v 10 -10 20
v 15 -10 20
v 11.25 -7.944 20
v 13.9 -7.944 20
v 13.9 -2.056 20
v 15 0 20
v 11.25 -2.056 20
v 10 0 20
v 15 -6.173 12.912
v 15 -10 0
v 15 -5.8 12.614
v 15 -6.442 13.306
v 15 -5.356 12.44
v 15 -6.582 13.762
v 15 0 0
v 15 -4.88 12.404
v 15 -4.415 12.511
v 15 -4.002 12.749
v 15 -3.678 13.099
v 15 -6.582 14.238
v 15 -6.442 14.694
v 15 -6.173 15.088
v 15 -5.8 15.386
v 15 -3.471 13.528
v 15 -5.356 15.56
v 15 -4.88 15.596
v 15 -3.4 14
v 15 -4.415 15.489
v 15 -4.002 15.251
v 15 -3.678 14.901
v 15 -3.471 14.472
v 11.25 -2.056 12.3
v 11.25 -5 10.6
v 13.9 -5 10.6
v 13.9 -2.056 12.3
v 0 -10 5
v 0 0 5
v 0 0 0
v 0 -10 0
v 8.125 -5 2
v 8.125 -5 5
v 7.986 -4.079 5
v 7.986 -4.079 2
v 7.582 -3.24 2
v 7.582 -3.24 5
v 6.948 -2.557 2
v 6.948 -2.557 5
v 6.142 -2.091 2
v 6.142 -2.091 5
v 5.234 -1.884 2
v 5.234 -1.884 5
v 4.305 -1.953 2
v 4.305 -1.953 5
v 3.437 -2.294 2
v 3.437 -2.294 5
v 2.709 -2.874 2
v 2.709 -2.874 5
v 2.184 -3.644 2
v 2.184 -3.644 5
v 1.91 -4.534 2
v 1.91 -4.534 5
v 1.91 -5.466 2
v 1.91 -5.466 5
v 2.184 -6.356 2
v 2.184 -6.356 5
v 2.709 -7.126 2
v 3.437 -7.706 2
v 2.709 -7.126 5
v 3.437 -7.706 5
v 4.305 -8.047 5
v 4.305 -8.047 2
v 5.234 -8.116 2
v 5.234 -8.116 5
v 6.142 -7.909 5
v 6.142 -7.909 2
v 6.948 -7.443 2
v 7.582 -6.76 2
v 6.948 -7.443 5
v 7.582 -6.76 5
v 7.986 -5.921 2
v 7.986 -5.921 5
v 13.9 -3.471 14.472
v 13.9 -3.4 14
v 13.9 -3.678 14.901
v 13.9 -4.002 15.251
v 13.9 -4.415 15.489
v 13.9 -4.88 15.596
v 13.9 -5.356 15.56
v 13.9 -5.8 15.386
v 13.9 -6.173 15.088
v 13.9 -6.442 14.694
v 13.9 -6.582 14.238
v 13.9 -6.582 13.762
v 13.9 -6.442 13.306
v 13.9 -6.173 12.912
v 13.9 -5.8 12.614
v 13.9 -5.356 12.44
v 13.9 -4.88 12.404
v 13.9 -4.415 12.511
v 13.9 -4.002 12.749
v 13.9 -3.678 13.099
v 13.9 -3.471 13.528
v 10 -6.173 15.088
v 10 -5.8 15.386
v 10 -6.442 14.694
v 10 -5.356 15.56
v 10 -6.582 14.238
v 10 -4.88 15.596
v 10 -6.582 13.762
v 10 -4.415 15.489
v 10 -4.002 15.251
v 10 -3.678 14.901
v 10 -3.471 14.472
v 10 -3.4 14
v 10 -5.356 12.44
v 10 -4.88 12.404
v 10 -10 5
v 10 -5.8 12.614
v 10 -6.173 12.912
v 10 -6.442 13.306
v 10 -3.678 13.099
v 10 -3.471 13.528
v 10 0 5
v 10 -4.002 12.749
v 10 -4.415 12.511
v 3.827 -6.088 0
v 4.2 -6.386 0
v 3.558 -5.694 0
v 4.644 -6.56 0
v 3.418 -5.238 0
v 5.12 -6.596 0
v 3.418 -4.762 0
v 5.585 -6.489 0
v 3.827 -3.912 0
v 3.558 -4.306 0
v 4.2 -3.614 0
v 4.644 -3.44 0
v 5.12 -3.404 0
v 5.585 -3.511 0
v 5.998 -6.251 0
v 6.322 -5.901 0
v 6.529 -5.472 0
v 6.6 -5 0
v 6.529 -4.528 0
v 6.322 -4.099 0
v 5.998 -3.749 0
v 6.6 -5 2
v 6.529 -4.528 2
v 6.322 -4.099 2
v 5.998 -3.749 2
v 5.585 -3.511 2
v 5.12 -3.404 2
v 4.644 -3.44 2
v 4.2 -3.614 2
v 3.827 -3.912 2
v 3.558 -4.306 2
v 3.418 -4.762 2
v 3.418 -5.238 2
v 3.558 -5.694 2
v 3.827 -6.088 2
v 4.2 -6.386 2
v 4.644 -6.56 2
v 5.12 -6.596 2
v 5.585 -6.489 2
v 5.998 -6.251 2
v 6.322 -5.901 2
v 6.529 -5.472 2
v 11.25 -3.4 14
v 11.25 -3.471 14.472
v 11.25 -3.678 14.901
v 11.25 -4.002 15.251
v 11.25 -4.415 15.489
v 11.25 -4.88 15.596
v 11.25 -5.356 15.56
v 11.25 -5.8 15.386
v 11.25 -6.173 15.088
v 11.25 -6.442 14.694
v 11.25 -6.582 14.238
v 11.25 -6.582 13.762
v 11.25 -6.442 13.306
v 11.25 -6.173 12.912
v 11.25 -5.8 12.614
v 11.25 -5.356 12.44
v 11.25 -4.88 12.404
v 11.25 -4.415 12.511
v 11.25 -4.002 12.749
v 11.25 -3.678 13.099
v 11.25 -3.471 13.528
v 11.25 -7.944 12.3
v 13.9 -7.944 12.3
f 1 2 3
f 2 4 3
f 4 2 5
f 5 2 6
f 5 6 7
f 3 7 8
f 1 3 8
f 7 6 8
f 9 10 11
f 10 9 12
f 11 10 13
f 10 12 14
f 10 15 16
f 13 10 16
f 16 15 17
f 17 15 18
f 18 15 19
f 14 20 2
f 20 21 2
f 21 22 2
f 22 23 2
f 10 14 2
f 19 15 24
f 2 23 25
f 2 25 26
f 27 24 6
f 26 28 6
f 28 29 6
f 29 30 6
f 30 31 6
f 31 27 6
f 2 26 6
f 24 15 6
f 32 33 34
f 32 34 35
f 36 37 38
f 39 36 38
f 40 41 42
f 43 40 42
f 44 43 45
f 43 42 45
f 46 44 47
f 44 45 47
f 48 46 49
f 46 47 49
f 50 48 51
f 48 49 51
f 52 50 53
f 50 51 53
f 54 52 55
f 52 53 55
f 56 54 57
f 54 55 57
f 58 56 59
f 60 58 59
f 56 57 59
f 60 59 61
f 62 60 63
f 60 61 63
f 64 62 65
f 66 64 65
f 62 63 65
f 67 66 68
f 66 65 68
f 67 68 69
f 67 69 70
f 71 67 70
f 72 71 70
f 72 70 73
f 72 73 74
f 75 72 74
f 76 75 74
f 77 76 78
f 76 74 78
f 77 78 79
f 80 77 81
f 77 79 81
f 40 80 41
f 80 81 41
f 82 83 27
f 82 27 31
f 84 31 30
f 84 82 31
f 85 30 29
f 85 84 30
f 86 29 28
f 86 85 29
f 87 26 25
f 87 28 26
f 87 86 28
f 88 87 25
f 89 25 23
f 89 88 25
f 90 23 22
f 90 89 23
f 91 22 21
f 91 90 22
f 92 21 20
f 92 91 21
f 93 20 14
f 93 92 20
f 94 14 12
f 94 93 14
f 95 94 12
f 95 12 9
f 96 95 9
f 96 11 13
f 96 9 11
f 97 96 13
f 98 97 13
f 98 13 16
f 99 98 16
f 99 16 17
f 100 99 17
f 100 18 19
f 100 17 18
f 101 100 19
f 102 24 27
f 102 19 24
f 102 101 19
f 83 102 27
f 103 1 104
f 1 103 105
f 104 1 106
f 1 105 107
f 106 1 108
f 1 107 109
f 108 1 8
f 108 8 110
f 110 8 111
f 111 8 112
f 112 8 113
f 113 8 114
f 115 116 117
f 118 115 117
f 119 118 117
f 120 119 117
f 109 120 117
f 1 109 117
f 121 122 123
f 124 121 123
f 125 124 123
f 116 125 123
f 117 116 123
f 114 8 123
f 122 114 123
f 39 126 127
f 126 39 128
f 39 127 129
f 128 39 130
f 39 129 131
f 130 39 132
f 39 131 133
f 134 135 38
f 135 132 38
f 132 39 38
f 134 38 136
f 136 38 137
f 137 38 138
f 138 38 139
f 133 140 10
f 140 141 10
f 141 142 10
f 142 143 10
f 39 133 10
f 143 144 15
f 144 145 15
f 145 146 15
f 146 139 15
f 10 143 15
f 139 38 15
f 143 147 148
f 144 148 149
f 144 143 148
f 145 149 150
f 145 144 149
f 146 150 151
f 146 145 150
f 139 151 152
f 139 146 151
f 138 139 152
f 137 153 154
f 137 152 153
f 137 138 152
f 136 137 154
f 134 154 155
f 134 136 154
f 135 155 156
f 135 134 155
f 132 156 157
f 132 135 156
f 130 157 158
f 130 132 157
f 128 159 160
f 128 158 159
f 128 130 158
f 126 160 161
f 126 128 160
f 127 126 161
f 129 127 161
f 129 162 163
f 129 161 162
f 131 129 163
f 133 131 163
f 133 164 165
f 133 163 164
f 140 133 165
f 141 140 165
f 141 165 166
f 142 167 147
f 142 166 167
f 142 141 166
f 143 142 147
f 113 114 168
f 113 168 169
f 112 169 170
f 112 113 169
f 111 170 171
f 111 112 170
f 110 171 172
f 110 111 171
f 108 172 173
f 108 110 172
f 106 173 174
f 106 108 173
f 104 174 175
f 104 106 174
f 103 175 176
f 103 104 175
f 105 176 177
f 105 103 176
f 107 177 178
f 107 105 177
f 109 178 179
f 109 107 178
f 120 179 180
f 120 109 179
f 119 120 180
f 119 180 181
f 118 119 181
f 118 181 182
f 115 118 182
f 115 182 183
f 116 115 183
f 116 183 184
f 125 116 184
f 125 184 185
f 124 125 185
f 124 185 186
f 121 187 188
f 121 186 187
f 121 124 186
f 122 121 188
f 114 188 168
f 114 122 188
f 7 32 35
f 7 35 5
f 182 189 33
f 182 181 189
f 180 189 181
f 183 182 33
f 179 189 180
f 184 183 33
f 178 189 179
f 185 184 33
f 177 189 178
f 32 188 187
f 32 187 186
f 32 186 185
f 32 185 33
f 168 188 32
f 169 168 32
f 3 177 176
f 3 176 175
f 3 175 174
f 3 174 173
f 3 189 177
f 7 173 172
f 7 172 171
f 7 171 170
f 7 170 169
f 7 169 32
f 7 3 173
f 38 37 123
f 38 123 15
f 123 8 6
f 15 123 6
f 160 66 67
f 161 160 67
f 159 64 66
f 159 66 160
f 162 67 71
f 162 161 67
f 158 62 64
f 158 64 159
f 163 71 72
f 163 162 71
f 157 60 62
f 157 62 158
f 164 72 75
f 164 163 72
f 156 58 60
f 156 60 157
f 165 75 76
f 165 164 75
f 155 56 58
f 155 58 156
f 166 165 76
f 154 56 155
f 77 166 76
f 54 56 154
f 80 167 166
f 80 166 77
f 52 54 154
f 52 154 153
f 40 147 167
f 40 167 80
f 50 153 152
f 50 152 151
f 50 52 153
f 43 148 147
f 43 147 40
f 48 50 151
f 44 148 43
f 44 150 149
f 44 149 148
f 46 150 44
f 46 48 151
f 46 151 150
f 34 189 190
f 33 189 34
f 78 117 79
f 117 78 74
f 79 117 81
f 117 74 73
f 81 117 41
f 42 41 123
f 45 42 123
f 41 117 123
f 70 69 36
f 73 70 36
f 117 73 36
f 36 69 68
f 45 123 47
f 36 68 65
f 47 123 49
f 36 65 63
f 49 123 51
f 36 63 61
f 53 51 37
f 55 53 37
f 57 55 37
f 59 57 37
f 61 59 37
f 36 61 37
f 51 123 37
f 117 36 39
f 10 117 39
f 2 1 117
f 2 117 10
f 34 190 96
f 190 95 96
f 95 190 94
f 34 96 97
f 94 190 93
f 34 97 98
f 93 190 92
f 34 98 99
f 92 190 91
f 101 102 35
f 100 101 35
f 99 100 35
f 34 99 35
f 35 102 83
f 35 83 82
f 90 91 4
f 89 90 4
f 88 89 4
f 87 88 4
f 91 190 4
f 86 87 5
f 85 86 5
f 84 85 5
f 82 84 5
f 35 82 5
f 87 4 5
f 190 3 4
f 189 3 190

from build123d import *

# Parameters (mm, degrees)
PAD_DEPTH       = 10
SKETCH001_R     = 1.6
POCKET_DEPTH    = 20.001
SKETCH002_R     = 1.6
POCKET001_DEPTH = 15.001
POCKET002_DEPTH = 2.65
SKETCH004_R     = 3.125
POCKET003_DEPTH = 3


with BuildPart() as part:
    # Sketch → Pad (new body)
    with BuildSketch(Plane.XZ):
        Polygon((15, 20), (10, 20), (10, 5), (0, 5), (0, 0), (15, 0), (15, 14), align=None)
    extrude(amount=PAD_DEPTH)

    # Sketch001 → Pocket (cut, through all)
    with BuildSketch(Plane.XY):
        with Locations((5, -5)):
            Circle(SKETCH001_R)
    extrude(amount=POCKET_DEPTH, mode=Mode.SUBTRACT)

    # Sketch002 → Pocket001 (cut, through all)
    with BuildSketch(Plane.YZ):
        with Locations((-5, 14)):
            Circle(SKETCH002_R)
    extrude(amount=POCKET001_DEPTH, mode=Mode.SUBTRACT)

    # Sketch003 → Pocket002 (cut)
    with BuildSketch(Plane.YZ.offset(11.25)):
        Polygon((-2.055514, 12.3), (-2.055514, 15.7), (-2.055514, 20.7), (-7.944486, 20.7), (-7.944486, 15.7), (-7.944486, 12.3), (-5, 10.6), align=None)
    extrude(amount=POCKET002_DEPTH, mode=Mode.SUBTRACT)

    # Sketch004 → Pocket003 (cut)
    with BuildSketch(Plane.XY.offset(5)):
        with Locations((5, -5)):
            Circle(SKETCH004_R)
    extrude(amount=-POCKET003_DEPTH, mode=Mode.SUBTRACT)


solid = part.part
